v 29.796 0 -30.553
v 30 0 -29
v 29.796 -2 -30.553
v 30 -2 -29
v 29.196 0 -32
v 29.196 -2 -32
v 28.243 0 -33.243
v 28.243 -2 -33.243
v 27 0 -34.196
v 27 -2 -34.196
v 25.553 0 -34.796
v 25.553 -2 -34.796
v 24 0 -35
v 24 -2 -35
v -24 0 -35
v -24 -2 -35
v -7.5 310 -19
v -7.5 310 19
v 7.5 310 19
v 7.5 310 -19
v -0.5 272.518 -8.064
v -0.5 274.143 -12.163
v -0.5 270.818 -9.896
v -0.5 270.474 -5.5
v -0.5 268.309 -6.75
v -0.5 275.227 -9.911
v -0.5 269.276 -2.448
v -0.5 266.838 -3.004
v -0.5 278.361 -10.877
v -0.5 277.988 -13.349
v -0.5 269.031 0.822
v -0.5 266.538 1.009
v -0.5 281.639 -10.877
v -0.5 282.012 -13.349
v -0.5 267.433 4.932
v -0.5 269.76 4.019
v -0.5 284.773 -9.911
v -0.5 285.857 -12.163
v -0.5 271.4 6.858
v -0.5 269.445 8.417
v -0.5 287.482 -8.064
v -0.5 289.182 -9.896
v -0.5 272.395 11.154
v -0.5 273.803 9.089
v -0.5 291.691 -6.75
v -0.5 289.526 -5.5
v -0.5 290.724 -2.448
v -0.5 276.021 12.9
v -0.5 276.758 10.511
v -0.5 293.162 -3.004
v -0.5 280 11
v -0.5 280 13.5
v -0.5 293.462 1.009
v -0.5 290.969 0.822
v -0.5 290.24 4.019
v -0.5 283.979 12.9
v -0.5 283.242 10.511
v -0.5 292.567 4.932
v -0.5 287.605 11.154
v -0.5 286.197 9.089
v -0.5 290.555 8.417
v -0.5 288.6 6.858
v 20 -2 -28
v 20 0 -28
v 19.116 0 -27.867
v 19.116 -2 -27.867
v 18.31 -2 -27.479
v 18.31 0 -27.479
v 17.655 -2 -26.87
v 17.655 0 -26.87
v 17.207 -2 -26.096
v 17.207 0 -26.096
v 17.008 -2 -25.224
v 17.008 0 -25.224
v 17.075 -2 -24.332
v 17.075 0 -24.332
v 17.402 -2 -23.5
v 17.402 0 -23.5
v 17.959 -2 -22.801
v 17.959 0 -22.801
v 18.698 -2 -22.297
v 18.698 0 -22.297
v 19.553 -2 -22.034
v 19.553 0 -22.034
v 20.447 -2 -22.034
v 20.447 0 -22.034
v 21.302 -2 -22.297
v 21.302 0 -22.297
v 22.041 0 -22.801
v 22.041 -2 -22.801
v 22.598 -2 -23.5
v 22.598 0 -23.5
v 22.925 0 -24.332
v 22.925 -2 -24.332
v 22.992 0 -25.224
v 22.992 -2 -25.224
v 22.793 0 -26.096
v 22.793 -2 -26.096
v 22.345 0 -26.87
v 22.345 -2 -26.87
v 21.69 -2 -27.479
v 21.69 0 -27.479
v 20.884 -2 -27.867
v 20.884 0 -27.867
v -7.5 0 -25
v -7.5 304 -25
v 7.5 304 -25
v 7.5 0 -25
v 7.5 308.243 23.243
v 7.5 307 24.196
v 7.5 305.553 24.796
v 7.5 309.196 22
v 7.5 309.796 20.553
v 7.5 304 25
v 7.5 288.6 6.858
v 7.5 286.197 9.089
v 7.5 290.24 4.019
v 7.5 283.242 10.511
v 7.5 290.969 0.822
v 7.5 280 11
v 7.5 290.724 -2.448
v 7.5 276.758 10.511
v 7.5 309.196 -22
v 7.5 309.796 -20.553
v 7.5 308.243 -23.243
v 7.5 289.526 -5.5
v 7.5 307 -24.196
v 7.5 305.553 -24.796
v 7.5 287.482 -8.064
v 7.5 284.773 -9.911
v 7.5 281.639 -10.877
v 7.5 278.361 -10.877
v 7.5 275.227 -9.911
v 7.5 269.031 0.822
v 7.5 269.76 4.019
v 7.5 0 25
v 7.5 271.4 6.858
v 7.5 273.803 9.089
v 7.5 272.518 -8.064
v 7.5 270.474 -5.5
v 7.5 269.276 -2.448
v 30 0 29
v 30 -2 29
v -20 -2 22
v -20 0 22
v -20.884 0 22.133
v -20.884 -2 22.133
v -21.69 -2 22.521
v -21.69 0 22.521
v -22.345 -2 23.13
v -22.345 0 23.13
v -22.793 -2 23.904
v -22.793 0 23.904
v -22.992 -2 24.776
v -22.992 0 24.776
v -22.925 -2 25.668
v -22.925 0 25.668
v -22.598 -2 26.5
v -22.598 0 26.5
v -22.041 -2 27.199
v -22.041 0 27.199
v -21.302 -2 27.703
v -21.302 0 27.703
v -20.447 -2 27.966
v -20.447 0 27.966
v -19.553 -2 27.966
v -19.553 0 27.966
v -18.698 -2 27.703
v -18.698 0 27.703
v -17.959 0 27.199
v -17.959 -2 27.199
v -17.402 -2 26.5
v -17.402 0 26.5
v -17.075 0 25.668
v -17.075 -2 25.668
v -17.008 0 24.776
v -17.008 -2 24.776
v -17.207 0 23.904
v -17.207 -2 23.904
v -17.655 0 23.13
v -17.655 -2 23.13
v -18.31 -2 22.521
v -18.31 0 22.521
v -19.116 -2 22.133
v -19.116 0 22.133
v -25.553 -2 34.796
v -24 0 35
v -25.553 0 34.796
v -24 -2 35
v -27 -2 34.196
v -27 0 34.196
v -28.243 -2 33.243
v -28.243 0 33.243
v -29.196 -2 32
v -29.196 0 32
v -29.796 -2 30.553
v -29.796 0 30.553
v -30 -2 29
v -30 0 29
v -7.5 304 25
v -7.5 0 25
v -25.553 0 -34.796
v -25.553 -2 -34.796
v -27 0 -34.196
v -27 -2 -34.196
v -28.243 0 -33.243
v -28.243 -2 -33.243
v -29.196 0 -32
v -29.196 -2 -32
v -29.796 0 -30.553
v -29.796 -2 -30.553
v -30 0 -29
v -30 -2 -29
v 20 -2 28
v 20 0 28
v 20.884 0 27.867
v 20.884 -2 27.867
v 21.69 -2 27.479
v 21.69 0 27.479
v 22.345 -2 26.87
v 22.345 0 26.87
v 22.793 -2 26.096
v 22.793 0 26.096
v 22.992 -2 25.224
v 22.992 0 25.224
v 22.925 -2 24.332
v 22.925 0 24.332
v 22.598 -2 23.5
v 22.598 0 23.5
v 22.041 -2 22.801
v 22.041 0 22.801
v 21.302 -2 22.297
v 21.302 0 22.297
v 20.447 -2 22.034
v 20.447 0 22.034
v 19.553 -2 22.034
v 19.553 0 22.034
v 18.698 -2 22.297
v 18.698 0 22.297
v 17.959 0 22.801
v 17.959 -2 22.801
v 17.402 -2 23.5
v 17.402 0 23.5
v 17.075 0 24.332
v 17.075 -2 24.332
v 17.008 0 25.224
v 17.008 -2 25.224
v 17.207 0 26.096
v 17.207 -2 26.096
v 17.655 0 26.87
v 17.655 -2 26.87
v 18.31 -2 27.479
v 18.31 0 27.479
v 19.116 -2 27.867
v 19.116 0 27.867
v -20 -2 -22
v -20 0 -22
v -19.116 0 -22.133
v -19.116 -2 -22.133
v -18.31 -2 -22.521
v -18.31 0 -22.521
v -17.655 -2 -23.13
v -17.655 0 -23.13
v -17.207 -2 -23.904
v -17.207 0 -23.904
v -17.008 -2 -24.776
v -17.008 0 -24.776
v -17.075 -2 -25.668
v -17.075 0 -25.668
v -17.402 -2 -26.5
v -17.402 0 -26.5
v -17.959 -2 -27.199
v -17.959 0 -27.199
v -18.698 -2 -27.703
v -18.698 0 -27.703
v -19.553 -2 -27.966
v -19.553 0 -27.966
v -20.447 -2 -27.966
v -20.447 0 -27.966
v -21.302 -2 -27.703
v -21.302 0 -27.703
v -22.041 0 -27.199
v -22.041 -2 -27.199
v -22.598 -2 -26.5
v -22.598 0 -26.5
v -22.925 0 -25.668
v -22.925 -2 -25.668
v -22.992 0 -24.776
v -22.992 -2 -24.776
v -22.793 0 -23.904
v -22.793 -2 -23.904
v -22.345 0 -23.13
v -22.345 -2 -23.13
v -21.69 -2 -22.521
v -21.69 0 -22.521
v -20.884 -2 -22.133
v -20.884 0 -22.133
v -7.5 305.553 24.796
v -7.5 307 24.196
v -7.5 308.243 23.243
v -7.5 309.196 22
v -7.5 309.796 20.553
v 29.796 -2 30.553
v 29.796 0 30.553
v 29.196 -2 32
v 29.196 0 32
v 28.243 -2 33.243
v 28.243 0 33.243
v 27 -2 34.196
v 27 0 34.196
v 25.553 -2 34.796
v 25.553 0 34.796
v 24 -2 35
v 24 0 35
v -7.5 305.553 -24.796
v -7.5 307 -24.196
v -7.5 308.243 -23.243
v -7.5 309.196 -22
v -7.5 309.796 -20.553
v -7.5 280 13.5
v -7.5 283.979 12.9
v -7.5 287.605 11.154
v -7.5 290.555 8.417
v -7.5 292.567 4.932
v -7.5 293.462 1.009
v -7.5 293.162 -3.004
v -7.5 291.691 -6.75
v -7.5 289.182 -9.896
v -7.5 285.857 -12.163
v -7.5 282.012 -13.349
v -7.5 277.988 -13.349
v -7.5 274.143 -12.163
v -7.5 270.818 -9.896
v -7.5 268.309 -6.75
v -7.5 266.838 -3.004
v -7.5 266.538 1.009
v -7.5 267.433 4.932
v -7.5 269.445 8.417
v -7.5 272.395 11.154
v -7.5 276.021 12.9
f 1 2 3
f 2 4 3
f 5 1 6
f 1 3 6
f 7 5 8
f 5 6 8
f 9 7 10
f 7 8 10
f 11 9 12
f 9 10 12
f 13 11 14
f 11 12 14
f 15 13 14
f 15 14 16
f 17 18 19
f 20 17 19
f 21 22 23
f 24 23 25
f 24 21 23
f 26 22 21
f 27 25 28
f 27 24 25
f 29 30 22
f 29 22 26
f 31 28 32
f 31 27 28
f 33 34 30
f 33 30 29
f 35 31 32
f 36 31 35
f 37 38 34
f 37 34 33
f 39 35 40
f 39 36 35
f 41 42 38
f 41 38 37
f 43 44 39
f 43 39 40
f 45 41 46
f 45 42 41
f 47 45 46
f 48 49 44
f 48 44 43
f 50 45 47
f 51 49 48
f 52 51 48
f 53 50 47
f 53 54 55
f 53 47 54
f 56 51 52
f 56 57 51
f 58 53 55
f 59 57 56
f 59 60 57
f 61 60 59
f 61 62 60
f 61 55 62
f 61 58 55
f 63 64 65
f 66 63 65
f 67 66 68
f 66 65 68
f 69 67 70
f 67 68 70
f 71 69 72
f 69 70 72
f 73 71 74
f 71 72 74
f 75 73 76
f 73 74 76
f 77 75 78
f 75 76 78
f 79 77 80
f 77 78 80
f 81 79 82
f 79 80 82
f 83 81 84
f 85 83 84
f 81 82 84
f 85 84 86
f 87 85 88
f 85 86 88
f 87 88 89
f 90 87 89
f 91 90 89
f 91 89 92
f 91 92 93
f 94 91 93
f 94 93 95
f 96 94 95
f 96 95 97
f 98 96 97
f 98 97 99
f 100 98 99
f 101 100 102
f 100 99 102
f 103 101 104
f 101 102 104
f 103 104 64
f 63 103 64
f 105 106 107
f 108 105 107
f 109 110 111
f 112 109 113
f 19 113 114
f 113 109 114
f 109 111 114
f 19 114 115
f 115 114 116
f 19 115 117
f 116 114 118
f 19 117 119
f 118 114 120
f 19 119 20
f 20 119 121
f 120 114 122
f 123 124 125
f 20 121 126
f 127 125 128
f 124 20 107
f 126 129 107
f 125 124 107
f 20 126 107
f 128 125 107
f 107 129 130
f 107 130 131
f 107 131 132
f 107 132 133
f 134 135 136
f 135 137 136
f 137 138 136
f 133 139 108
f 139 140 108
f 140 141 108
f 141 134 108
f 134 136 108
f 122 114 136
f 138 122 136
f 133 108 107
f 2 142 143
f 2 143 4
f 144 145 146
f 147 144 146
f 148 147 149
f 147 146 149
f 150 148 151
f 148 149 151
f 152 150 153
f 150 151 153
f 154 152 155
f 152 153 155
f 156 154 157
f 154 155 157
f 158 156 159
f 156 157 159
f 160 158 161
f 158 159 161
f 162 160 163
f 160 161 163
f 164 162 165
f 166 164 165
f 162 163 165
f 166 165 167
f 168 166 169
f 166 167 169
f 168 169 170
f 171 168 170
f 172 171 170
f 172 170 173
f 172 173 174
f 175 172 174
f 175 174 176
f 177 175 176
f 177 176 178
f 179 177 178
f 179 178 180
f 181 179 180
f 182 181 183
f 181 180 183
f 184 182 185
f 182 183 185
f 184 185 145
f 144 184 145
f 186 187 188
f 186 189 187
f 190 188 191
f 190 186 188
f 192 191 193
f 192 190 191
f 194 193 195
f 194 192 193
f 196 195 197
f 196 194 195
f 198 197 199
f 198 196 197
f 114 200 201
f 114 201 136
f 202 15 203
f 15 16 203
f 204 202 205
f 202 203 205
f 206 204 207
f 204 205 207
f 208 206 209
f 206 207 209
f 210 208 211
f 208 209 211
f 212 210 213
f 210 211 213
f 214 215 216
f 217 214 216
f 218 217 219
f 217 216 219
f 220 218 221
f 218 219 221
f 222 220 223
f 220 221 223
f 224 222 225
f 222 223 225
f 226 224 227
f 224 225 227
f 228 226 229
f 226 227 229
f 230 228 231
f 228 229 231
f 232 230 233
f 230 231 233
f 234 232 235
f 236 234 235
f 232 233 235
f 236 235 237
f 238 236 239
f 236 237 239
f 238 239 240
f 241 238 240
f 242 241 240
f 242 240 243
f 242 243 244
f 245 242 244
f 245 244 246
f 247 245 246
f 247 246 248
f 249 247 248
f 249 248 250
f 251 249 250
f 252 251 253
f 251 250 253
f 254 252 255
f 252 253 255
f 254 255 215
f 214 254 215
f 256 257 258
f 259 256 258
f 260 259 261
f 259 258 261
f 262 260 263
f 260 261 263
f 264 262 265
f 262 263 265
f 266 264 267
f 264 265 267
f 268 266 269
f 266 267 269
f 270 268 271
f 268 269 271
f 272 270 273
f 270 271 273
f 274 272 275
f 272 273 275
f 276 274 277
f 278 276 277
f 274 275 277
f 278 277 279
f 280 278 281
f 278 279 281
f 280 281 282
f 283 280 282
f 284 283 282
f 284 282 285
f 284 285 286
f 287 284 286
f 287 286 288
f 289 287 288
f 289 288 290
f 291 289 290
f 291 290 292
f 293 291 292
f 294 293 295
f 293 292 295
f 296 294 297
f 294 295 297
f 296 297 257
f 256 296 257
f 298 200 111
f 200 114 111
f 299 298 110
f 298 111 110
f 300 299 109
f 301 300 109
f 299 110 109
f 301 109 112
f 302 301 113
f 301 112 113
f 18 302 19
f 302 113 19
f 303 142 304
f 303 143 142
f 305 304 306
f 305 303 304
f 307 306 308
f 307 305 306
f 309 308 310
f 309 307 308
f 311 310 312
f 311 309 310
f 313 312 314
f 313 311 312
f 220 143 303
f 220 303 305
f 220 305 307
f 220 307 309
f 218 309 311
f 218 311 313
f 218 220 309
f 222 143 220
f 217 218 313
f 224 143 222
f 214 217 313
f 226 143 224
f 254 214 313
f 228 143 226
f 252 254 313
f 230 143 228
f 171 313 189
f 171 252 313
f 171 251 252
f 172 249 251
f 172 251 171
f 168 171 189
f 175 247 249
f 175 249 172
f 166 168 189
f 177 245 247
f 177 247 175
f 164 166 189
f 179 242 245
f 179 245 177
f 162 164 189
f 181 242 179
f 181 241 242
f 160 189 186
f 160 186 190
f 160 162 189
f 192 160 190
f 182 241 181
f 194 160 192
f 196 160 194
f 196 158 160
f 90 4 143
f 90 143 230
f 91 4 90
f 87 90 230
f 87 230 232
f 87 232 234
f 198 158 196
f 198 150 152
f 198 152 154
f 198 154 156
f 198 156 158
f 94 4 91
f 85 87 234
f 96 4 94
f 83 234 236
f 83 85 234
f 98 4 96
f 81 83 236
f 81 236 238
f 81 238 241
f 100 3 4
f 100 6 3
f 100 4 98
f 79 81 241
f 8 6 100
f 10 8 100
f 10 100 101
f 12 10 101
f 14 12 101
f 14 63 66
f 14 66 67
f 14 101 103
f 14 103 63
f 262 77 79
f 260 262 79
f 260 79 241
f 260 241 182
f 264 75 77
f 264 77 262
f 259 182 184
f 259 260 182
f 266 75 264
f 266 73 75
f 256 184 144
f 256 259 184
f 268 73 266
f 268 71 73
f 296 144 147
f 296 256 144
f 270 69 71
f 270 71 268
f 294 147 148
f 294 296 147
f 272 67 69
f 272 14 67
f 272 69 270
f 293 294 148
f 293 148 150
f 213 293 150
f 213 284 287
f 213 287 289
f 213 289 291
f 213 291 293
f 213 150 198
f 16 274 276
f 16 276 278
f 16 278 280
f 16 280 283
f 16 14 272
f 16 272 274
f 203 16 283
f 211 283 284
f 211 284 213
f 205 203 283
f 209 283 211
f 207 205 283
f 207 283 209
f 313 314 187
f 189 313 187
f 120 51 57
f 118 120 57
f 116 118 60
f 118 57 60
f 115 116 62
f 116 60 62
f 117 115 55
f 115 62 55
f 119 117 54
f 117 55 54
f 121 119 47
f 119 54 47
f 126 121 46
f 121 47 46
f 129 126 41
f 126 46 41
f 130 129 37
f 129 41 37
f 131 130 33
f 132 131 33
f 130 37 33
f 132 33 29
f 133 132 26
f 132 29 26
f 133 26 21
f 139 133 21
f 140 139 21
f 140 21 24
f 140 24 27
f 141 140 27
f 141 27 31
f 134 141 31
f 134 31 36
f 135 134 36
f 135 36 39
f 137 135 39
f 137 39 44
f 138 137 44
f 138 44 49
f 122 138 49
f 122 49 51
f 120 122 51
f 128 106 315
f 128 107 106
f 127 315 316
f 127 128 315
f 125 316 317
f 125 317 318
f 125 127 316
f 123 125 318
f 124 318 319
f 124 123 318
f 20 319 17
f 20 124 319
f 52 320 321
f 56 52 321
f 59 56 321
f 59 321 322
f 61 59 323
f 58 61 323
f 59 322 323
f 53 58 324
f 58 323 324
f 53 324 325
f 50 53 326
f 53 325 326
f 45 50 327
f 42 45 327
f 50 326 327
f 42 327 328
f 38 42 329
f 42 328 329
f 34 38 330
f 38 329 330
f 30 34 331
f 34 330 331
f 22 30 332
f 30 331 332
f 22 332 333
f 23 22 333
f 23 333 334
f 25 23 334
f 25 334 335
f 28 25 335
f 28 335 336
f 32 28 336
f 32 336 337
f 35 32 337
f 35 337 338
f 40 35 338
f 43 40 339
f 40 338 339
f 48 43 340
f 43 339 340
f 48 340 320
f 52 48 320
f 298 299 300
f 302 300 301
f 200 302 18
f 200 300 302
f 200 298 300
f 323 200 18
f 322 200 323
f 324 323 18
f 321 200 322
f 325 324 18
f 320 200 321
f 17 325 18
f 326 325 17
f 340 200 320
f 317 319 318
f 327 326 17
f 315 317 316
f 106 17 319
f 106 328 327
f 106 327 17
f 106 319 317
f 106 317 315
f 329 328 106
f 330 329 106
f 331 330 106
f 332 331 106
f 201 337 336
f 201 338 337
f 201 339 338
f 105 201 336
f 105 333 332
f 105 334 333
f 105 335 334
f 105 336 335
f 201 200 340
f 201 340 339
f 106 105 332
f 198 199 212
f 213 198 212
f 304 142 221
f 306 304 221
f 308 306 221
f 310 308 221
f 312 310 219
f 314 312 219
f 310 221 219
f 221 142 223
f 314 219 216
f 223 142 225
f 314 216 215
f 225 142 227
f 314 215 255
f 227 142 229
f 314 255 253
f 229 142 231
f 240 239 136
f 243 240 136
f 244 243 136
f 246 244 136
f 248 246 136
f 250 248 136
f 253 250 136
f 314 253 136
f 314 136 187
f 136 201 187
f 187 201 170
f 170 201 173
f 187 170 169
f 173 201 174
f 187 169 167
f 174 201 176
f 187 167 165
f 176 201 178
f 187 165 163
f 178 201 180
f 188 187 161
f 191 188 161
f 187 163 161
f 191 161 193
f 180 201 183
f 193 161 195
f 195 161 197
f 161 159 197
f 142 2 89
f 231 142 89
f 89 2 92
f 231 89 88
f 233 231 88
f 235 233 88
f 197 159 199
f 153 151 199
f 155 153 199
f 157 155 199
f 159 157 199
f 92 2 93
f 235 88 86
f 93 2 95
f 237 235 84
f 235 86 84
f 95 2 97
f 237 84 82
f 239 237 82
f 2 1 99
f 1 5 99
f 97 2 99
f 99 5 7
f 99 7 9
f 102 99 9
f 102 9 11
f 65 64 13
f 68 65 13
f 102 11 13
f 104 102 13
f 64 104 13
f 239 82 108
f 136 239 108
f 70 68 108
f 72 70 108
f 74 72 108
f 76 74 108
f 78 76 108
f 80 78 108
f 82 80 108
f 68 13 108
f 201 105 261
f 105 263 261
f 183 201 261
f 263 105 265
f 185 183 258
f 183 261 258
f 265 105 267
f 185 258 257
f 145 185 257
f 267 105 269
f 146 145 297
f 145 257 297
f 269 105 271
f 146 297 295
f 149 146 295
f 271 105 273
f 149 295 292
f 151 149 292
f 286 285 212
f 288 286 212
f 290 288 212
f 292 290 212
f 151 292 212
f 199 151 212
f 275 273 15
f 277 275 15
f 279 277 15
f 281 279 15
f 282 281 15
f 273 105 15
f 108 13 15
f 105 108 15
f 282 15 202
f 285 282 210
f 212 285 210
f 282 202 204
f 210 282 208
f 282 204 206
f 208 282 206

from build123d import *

# Parameters (mm, degrees)
SKETCH1_W           = 15
SKETCH1_H           = 50
BOSS_EXTRUDE1_DEPTH = 310
SKETCH2_W           = 60
SKETCH2_H           = 70
BOSS_EXTRUDE2_DEPTH = 2
SKETCH4_R           = 3
CUT_EXTRUDE1_DEPTH  = 2
FILLET1_R           = 6
SKETCH5_R           = 13.5
CUT_EXTRUDE2_DEPTH  = 7
SKETCH6_R           = 11
CUT_EXTRUDE3_DEPTH  = 314.456934841
FILLET2_R           = 6


with BuildPart() as part:
    # Sketch1 → Boss-Extrude1 (new body)
    with BuildSketch(Plane(origin=(0, 0, 0), x_dir=(1, 0, 0), z_dir=(0, 1, 0))):
        Rectangle(SKETCH1_W, SKETCH1_H)
    extrude(amount=BOSS_EXTRUDE1_DEPTH)

    # Sketch2 → Boss-Extrude2 (add)
    with BuildSketch(Plane(origin=(0, 0, 0), x_dir=(-1, 0, 0), z_dir=(0, -1, 0))):
        Rectangle(SKETCH2_W, SKETCH2_H)
    extrude(amount=BOSS_EXTRUDE2_DEPTH)

    # Sketch4 → Cut-Extrude1 (cut)
    with BuildSketch(Plane(origin=(0, 0, 0), x_dir=(1, 0, 0), z_dir=(0, 1, 0))):
        with Locations(Location((20, -25, 0), (0, 0, 270))):
            Circle(SKETCH4_R)
        with Locations(Location((-20, -25, 0), (0, 0, 90))):
            Circle(SKETCH4_R)
        with Locations(Location((-20, 25, 0), (0, 0, 270))):
            Circle(SKETCH4_R)
        with Locations(Location((20, 25, 0), (0, 0, 90))):
            Circle(SKETCH4_R)
    extrude(amount=-CUT_EXTRUDE1_DEPTH, mode=Mode.SUBTRACT)

    # Fillet1
    fillet1_edges = [part.edges().sort_by_distance(p)[0] for p in [
        (-30, -1, 35),
        (-30, -1, -35),
        (30, -1, -35),
        (30, -1, 35),
    ]]
    fillet(fillet1_edges, radius=FILLET1_R)

    # Sketch5 → Cut-Extrude2 (cut)
    with BuildSketch(Plane.ZY.offset(7.5)):
        with Locations((0, 280)):
            Circle(SKETCH5_R)
    extrude(amount=-CUT_EXTRUDE2_DEPTH, mode=Mode.SUBTRACT)

    # Sketch6 → Cut-Extrude3 (cut, through all)
    with BuildSketch(Plane.ZY.offset(0.5)):
        with Locations((0, 280)):
            Circle(SKETCH6_R)
    extrude(amount=-CUT_EXTRUDE3_DEPTH, mode=Mode.SUBTRACT)

    # Fillet2
    fillet2_edges = [part.edges().sort_by_distance(p)[0] for p in [
        (0, 310, 25),
        (0, 310, -25),
    ]]
    fillet(fillet2_edges, radius=FILLET2_R)


solid = part.part
